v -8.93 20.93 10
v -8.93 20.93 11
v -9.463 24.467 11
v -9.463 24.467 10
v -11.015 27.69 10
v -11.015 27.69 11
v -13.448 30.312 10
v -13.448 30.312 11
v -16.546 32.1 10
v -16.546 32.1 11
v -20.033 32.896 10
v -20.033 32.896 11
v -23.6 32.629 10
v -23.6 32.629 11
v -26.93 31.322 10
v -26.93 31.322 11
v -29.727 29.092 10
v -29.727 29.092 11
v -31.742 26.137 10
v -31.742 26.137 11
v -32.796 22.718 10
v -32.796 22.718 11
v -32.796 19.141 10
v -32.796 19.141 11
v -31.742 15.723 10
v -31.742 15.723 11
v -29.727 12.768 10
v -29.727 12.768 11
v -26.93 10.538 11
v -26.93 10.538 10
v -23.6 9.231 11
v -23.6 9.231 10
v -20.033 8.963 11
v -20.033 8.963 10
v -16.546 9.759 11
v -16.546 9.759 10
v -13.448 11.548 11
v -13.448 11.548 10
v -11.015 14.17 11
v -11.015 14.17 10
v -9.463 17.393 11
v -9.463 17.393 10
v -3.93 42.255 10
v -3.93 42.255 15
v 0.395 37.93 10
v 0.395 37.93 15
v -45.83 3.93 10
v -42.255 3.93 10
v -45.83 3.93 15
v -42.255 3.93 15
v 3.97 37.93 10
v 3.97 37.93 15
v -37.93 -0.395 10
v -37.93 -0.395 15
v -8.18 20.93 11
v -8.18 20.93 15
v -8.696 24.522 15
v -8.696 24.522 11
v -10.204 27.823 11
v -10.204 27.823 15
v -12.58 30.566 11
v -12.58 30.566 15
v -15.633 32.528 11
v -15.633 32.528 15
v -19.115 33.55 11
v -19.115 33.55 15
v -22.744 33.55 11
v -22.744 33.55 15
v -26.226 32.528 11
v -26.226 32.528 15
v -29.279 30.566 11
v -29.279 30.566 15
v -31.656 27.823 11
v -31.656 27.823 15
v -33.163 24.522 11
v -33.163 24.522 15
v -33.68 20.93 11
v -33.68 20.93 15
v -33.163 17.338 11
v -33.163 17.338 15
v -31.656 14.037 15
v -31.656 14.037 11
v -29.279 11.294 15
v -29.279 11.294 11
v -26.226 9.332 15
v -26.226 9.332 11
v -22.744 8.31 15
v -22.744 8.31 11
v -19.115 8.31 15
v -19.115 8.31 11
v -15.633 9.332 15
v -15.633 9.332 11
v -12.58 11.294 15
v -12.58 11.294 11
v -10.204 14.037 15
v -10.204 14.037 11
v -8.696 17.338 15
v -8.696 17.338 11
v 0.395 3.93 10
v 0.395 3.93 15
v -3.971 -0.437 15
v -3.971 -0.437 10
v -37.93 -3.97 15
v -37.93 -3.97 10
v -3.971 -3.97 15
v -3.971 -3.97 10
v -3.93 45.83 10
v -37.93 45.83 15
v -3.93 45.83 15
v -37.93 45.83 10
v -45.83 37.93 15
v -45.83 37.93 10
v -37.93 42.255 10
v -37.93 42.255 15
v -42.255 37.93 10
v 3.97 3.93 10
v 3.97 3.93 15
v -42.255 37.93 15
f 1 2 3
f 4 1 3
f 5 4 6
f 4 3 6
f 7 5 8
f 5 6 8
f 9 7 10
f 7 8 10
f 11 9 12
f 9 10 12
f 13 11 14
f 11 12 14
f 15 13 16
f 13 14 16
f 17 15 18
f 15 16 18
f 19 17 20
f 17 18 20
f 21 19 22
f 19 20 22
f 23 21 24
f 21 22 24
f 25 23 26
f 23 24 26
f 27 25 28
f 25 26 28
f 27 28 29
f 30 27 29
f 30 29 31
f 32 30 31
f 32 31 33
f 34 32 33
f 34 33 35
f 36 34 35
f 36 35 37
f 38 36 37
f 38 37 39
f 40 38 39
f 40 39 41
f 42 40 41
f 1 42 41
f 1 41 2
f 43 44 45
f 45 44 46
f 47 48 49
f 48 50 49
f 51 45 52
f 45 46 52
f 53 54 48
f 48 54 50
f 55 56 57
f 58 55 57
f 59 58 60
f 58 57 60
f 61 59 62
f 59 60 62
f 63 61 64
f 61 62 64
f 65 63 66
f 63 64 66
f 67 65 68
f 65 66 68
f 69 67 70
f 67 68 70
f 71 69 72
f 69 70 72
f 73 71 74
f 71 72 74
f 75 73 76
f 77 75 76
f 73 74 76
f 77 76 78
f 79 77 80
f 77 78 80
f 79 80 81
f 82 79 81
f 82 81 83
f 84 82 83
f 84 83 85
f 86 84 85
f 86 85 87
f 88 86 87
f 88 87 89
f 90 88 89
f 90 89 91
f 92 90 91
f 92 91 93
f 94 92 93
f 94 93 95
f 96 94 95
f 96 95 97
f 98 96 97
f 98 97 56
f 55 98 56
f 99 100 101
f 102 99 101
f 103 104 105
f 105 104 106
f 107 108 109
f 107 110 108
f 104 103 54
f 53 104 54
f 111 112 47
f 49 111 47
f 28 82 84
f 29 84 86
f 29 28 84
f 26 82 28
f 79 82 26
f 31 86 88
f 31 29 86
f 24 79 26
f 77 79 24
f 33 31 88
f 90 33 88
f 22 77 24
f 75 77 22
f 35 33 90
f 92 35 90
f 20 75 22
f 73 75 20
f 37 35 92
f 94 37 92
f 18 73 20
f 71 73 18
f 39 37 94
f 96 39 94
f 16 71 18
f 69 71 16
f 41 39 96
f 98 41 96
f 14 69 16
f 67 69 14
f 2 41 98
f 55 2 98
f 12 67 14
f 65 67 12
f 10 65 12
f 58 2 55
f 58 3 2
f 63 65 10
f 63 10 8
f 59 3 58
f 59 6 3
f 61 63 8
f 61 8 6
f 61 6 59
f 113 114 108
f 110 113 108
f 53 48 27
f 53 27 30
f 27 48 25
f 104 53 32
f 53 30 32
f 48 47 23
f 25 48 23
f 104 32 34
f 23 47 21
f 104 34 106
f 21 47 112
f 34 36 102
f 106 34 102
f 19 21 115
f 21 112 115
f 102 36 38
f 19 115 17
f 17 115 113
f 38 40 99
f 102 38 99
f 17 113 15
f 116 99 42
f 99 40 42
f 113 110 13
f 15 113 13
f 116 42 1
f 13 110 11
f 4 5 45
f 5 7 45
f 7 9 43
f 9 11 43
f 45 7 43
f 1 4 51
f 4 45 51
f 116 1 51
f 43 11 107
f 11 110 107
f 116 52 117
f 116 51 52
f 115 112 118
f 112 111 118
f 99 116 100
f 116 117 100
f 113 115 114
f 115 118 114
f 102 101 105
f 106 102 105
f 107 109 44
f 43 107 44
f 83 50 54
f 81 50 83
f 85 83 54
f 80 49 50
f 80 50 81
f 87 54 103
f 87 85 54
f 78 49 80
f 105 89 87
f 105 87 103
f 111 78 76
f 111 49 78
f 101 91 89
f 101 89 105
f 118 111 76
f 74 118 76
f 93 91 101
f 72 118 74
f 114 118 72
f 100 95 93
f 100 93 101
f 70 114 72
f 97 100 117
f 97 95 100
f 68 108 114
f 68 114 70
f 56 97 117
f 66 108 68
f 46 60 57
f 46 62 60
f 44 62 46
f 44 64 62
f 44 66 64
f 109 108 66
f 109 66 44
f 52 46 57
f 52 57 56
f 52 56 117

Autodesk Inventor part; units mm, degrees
ref_plane "YZ Plane" through (0, 0, 0) normal (1, 0, 0) x (0, 1, 0)
ref_plane "XZ Plane" through (0, 0, 0) normal (0, 1, 0) x (-1, 0, 0)
ref_plane "Work Plane1" through (0, 0, 10) normal (0, 0, 1) x (1, 0, 0)
sketch "Sketch1" plane through (0, 0, 10) normal (0, 0, 1) x (1, 0, 0)
  line L0 (-4.0299, -0.3538) -> (-2.2322, 1.4439) construction
  arc A0 (-1.4439, 2.2322) -> (-2.2322, 1.4439) centre (-0.9299, 0.9299) ccw construction
  line L1 (-1.4439, 2.2322) -> (0.3538, 4.0299) construction
  line L2 (-37.8299, 42.8299) -> (-37.8299, 37.8299) construction
  line L3 (-37.8299, 37.8299) -> (-42.9208, 37.8299) construction
  line L4 (-37.8299, 42.2137) -> (-37.8299, 45.8299) construction
  line L5 (-37.8299, 45.8299) -> (-4.0299, 45.8299) construction
  line L6 (-4.0299, 45.8299) -> (-4.0299, 42.2137) construction
  line L7 (-4.0299, 4.0299) -> (0.3538, 4.0299) projected
  circle A1 centre (-20.9299, 20.9299) radius 17.5 projected
  line L8 (-20.9299, 58.9723) -> (17.1124, 20.9299) construction
  line L9 (17.1124, 20.9299) -> (-20.9299, -17.1124) construction
  line L10 (-20.9299, -17.1124) -> (-58.9723, 20.9299) construction
  line L11 (-58.9723, 20.9299) -> (-20.9299, 58.9723) construction
  line L12 (-20.9299, 58.9723) -> (-20.9299, -17.1124) construction
  line L13 (17.1124, 20.9299) -> (-58.9723, 20.9299) construction
  line L14 (-20.9299, 58.9723) -> (32.8701, 58.9723) construction
  line L15 (-43.4299, 43.4299) -> (1.5701, 43.4299) construction
  line L16 (1.5701, 43.4299) -> (1.5701, -1.5701) construction
  line L17 (1.5701, -1.5701) -> (-43.4299, -1.5701) construction
  line L18 (-43.4299, -1.5701) -> (-43.4299, 43.4299) construction
  line L19 (-43.4299, 43.4299) -> (1.5701, -1.5701) construction
  line L20 (1.5701, 43.4299) -> (-43.4299, -1.5701) construction
  line L21 (-43.4299, 5.3876) -> (-43.4299, 36.4723)
  line L22 (-43.4299, 36.4723) -> (-36.4723, 43.4299)
  line L23 (-36.4723, 43.4299) -> (-5.3876, 43.4299)
  line L24 (-5.3876, 43.4299) -> (1.5701, 36.4723)
  line L25 (1.5701, 36.4723) -> (1.5701, 5.3876)
  line L26 (1.5701, 5.3876) -> (-5.3876, -1.5701)
  line L27 (-5.3876, -1.5701) -> (-36.4723, -1.5701)
  line L28 (-36.4723, -1.5701) -> (-43.4299, 5.3876)
  line L29 (-4.0299, 42.2137) -> (-37.8299, 42.2137) projected
  line L30 (-4.0299, -0.3538) -> (-4.0299, 4.0299) projected
  circle A2 centre (-20.9299, 20.9299) radius 1.5
  line L31 (-10.9299, 10.9299) -> (-30.9299, 10.9299) construction
  line L32 (-30.9299, 10.9299) -> (-30.9299, 30.9299) construction
  line L33 (-30.9299, 30.9299) -> (-10.9299, 30.9299) construction
  line L34 (-10.9299, 30.9299) -> (-10.9299, 10.9299) construction
  line L35 (-10.9299, 10.9299) -> (-30.9299, 30.9299) construction
  line L36 (-30.9299, 10.9299) -> (-10.9299, 30.9299) construction
  circle A3 centre (-30.9299, 30.9299) radius 1.4
  circle A4 centre (-30.9299, 10.9299) radius 1.4
  circle A5 centre (-10.9299, 10.9299) radius 1.4
  line L37 (-45.8299, 37.8299) -> (-42.0723, 37.8299) construction
  line L38 (-42.1723, 37.7299) -> (-45.8299, 37.7299)
  line L39 (-45.8299, 37.7299) -> (-45.8299, 4.1299)
  line L40 (-45.8299, 4.1299) -> (-42.1723, 4.1299)
  line L41 (-42.1723, 4.1299) -> (-42.1723, 37.7299)
  line L42 (-45.8299, 4.0299) -> (-42.0723, 4.0299) construction
  line L43 (-45.8299, 37.8299) -> (-42.0723, 37.8299) projected
  line L44 (-37.7299, 45.8299) -> (-4.1299, 45.8299)
  line L45 (-4.1299, 45.8299) -> (-4.1299, 42.1723)
  line L46 (-4.1299, 42.1723) -> (-37.7299, 42.1723)
  line L47 (-37.7299, 42.1723) -> (-37.7299, 45.8299)
  line L48 (0.4701, 37.8299) -> (0.4701, 4.0299) construction
  line L49 (0.4701, 4.0299) -> (3.9701, 4.0299) construction
  line L50 (3.9701, 37.8299) -> (3.9701, 4.0299) construction
  line L51 (0.4701, 37.8299) -> (3.9701, 37.8299) construction
  line L52 (-45.8299, -3.9701) -> (-4.0299, -3.9701) construction
  line L53 (0.3124, 37.7299) -> (3.9701, 37.7299)
  line L54 (3.9701, 37.7299) -> (3.9701, 4.1299)
  line L55 (3.9701, 4.1299) -> (0.3124, 4.1299)
  line L56 (0.3124, 4.1299) -> (0.3124, 37.7299)
  line L57 (-4.1713, -0.3538) -> (-37.7299, -0.3538)
  line L58 (-37.7299, -0.3538) -> (-37.7299, -3.9701)
  line L59 (-37.7299, -3.9701) -> (-4.1713, -3.9701)
  line L60 (-4.1713, -3.9701) -> (-4.1713, -0.3538)
  point P0 (-37.8299, 4.0299)
  dimension "d18" = 53.8
  dimension "d19" = 45
  dimension "d20" = 53.8
  dimension "d21" = 45
  dimension "d22" = 45
  dimension "d30" = 20
  dimension "d31" = 20
  dimension "d32" = 2.8
  dimension "d33" = 2.8
  dimension "d34" = 2.8
  dimension "d35" = 3
  dimension "d36" = 0.1
  dimension "d37" = 0.1
  dimension "d38" = 0.1
  dimension "d39" = 0.1
extrude "Extrusion1" add sketch "Sketch1" along normal blind 5 contours L30 L26 L57 L28 L41 L22 L46 L24 L56 L7 | L7 L26 L30 | L56 L24 L25 L26 | L26 L25 L24 L53 L54 L55 | L60 L59 L58 L57 L28 L27 L26 | L26 L27 L28 L57 | L46 L22 L29 L24 | L24 L29 L45 | L40 L39 L38 L22 L21 L28 | L28 L21 L22 L41 | L29 L22 L23 L24 | L24 L23 L22 L29 L47 L44 L45 | L47 L29 L22 | A1 | A2 | A3 | A4 | A5
sketch "Skizze4" plane through (0, 0, 15) normal (0, 0, 1) x (1, 0, 0)
  line L0 (-37.7299, 42.1723) -> (-42.1723, 37.7299) projected
  line L1 (-42.1723, 37.7299) -> (-45.8299, 37.7299) projected
  line L2 (-45.8299, 37.7299) -> (-45.8299, 4.1299) construction
  line L3 (-45.8299, 4.1299) -> (-42.1723, 4.1299) projected
  line L4 (-42.1723, 4.1299) -> (-37.6885, -0.3538) projected
  line L5 (-37.6885, -0.3538) -> (-37.7299, -0.3538) projected
  line L6 (-37.7299, -0.3538) -> (-37.7299, -3.9701) projected
  line L7 (-37.7299, -3.9701) -> (-4.1713, -3.9701) construction
  line L8 (-4.1713, -3.9701) -> (-4.1713, -0.3538) projected
  line L9 (-4.1713, -0.3538) -> (0.3124, 4.1299) projected
  line L10 (0.3124, 4.1299) -> (3.9701, 4.1299) projected
  line L11 (3.9701, 4.1299) -> (3.9701, 37.7299) construction
  line L12 (3.9701, 37.7299) -> (0.3124, 37.7299) projected
  line L13 (0.3124, 37.7299) -> (-4.1299, 42.1723) projected
  line L14 (-4.1299, 42.1723) -> (-4.1299, 45.8299) projected
  line L15 (-4.1299, 45.8299) -> (-37.7299, 45.8299) construction
  line L16 (-37.7299, 45.8299) -> (-37.7299, 42.1723) projected
  line L17 (-37.9299, 46.0299) -> (-3.9299, 46.0299) construction
  line L18 (-3.9299, 46.0299) -> (-3.9299, 42.2551)
  line L19 (-3.9299, 42.2551) -> (0.3953, 37.9299)
  line L20 (0.3953, 37.9299) -> (4.1701, 37.9299)
  line L21 (4.1701, 37.9299) -> (4.1701, 3.9299) construction
  line L22 (4.1701, 3.9299) -> (0.3953, 3.9299)
  line L23 (0.3953, 3.9299) -> (-3.9713, -0.4367)
  line L24 (-3.9713, -0.4367) -> (-3.9713, -4.1701)
  line L25 (-3.9713, -4.1701) -> (-37.9299, -4.1701) construction
  line L26 (-37.9299, -4.1701) -> (-37.9299, -0.3953)
  line L27 (-37.9299, -0.3953) -> (-42.2551, 3.9299)
  line L28 (-42.2551, 3.9299) -> (-46.0299, 3.9299)
  line L29 (-46.0299, 3.9299) -> (-46.0299, 37.9299) construction
  line L30 (-46.0299, 37.9299) -> (-42.2551, 37.9299)
  line L31 (-42.2551, 37.9299) -> (-37.9299, 42.2551)
  line L32 (-37.9299, 42.2551) -> (-37.9299, 46.0299)
  line L33 (-45.8299, 37.7299) -> (-45.8299, 37.9299)
  line L34 (-4.1299, 45.8299) -> (-37.7299, 45.8299) projected
  line L35 (-37.7299, 45.8299) -> (-37.9299, 45.8299)
  line L36 (-4.1299, 45.8299) -> (-3.9299, 45.8299)
  line L37 (3.9701, 37.7299) -> (3.9701, 37.9299)
  line L38 (3.9701, 4.1299) -> (3.9701, 37.7299) projected
  line L39 (3.9701, 4.1299) -> (3.9701, 3.9299)
  line L40 (-4.1713, -3.9701) -> (-3.9713, -3.9701)
  line L41 (-37.7299, -3.9701) -> (-37.9299, -3.9701)
  line L42 (-45.8299, 4.1299) -> (-45.8299, 3.9299)
  point P0 (0, 0)
  dimension "d40" = 0.2
extrude "IM_offset" add sketch "Skizze4" against normal up to surface (5 mm away)
sketch "Sketch20" plane through (0, 0, 15) normal (0, 0, 1) x (1, 0, 0)
  line L0 (-3.9299, 45.8299) -> (-37.9299, 45.8299) projected
  line L1 (-37.9299, 45.8299) -> (-37.9299, 42.2551) projected
  line L2 (-37.9299, 42.2551) -> (-42.2551, 37.9299) projected
  line L3 (-42.2551, 37.9299) -> (-45.8299, 37.9299) projected
  line L4 (-45.8299, 37.9299) -> (-45.8299, 3.9299) projected
  line L5 (-42.2551, 3.9299) -> (-45.8299, 3.9299) projected
  line L6 (-37.9299, -0.3953) -> (-42.2551, 3.9299) projected
  line L7 (-37.9299, -3.9701) -> (-37.9299, -0.3953) projected
  line L8 (-3.9713, -3.9701) -> (-37.9299, -3.9701) projected
  line L9 (-3.9713, -3.9701) -> (-3.9713, -0.4367) projected
  line L10 (-3.9713, -0.4367) -> (0.3953, 3.9299) projected
  line L11 (0.3953, 3.9299) -> (3.9701, 3.9299) projected
  line L12 (3.9701, 3.9299) -> (3.9701, 37.9299) projected
  line L13 (3.9701, 37.9299) -> (0.3953, 37.9299) projected
  line L14 (0.3953, 37.9299) -> (-3.9299, 42.2551) projected
  line L15 (-3.9299, 42.2551) -> (-3.9299, 45.8299) projected
  circle A0 centre (-20.9299, 20.9299) radius 12
  circle A1 centre (-28.9299, 12.9299) radius 3.95
  line L16 (-12.9299, 28.9299) -> (-28.9299, 28.9299)
  line L17 (-28.9299, 28.9299) -> (-28.9299, 12.9299)
  line L18 (-28.9299, 12.9299) -> (-12.9299, 12.9299)
  line L19 (-12.9299, 12.9299) -> (-12.9299, 28.9299)
  line L20 (-12.9299, 28.9299) -> (-28.9299, 12.9299) construction
  line L21 (-28.9299, 28.9299) -> (-12.9299, 12.9299) construction
  circle A2 centre (-28.9299, 28.9299) radius 3.95
  circle A3 centre (-12.9299, 28.9299) radius 3.95
  circle A4 centre (-12.9299, 12.9299) radius 3.95
  point P0 (0, 0)
  dimension "d113" = 24
  dimension "d114" = 7.9
  dimension "d115" = 16
  dimension "d116" = 16
  dimension "d117" = 7.9
  dimension "d118" = 7.9
  dimension "d119" = 7.9
extrude "Extrusion18" cut sketch "Sketch20" against normal through all contours A0 A4 L19 A3 | A3 L19 L16 A0 | A0 A4 L18 L19 | A3 L16 A2 A0 | A3 L16 L19 | L19 A4 L18 A1 L17 A2 L16 A3 | A0 A1 L18 A4 | L19 L18 A4 | A2 L16 L17 A0 | A0 A1 L17 L18 | A2 L17 A1 A0 | A2 L17 L16 | L18 L17 A1
sketch "Sketch23" plane through (0, 0, 15) normal (0, 0, 1) x (1, 0, 0)
  circle A0 centre (-20.9299, 20.9299) radius 12 projected
  circle A1 centre (-20.9299, 20.9299) radius 12.75
  point P0 (0, 0)
  dimension "d140" = 25.5
extrude "Extrusion19" cut sketch "Sketch23" against normal blind 4
properties part number "20_Cube_Insert_Filter_25mm"
